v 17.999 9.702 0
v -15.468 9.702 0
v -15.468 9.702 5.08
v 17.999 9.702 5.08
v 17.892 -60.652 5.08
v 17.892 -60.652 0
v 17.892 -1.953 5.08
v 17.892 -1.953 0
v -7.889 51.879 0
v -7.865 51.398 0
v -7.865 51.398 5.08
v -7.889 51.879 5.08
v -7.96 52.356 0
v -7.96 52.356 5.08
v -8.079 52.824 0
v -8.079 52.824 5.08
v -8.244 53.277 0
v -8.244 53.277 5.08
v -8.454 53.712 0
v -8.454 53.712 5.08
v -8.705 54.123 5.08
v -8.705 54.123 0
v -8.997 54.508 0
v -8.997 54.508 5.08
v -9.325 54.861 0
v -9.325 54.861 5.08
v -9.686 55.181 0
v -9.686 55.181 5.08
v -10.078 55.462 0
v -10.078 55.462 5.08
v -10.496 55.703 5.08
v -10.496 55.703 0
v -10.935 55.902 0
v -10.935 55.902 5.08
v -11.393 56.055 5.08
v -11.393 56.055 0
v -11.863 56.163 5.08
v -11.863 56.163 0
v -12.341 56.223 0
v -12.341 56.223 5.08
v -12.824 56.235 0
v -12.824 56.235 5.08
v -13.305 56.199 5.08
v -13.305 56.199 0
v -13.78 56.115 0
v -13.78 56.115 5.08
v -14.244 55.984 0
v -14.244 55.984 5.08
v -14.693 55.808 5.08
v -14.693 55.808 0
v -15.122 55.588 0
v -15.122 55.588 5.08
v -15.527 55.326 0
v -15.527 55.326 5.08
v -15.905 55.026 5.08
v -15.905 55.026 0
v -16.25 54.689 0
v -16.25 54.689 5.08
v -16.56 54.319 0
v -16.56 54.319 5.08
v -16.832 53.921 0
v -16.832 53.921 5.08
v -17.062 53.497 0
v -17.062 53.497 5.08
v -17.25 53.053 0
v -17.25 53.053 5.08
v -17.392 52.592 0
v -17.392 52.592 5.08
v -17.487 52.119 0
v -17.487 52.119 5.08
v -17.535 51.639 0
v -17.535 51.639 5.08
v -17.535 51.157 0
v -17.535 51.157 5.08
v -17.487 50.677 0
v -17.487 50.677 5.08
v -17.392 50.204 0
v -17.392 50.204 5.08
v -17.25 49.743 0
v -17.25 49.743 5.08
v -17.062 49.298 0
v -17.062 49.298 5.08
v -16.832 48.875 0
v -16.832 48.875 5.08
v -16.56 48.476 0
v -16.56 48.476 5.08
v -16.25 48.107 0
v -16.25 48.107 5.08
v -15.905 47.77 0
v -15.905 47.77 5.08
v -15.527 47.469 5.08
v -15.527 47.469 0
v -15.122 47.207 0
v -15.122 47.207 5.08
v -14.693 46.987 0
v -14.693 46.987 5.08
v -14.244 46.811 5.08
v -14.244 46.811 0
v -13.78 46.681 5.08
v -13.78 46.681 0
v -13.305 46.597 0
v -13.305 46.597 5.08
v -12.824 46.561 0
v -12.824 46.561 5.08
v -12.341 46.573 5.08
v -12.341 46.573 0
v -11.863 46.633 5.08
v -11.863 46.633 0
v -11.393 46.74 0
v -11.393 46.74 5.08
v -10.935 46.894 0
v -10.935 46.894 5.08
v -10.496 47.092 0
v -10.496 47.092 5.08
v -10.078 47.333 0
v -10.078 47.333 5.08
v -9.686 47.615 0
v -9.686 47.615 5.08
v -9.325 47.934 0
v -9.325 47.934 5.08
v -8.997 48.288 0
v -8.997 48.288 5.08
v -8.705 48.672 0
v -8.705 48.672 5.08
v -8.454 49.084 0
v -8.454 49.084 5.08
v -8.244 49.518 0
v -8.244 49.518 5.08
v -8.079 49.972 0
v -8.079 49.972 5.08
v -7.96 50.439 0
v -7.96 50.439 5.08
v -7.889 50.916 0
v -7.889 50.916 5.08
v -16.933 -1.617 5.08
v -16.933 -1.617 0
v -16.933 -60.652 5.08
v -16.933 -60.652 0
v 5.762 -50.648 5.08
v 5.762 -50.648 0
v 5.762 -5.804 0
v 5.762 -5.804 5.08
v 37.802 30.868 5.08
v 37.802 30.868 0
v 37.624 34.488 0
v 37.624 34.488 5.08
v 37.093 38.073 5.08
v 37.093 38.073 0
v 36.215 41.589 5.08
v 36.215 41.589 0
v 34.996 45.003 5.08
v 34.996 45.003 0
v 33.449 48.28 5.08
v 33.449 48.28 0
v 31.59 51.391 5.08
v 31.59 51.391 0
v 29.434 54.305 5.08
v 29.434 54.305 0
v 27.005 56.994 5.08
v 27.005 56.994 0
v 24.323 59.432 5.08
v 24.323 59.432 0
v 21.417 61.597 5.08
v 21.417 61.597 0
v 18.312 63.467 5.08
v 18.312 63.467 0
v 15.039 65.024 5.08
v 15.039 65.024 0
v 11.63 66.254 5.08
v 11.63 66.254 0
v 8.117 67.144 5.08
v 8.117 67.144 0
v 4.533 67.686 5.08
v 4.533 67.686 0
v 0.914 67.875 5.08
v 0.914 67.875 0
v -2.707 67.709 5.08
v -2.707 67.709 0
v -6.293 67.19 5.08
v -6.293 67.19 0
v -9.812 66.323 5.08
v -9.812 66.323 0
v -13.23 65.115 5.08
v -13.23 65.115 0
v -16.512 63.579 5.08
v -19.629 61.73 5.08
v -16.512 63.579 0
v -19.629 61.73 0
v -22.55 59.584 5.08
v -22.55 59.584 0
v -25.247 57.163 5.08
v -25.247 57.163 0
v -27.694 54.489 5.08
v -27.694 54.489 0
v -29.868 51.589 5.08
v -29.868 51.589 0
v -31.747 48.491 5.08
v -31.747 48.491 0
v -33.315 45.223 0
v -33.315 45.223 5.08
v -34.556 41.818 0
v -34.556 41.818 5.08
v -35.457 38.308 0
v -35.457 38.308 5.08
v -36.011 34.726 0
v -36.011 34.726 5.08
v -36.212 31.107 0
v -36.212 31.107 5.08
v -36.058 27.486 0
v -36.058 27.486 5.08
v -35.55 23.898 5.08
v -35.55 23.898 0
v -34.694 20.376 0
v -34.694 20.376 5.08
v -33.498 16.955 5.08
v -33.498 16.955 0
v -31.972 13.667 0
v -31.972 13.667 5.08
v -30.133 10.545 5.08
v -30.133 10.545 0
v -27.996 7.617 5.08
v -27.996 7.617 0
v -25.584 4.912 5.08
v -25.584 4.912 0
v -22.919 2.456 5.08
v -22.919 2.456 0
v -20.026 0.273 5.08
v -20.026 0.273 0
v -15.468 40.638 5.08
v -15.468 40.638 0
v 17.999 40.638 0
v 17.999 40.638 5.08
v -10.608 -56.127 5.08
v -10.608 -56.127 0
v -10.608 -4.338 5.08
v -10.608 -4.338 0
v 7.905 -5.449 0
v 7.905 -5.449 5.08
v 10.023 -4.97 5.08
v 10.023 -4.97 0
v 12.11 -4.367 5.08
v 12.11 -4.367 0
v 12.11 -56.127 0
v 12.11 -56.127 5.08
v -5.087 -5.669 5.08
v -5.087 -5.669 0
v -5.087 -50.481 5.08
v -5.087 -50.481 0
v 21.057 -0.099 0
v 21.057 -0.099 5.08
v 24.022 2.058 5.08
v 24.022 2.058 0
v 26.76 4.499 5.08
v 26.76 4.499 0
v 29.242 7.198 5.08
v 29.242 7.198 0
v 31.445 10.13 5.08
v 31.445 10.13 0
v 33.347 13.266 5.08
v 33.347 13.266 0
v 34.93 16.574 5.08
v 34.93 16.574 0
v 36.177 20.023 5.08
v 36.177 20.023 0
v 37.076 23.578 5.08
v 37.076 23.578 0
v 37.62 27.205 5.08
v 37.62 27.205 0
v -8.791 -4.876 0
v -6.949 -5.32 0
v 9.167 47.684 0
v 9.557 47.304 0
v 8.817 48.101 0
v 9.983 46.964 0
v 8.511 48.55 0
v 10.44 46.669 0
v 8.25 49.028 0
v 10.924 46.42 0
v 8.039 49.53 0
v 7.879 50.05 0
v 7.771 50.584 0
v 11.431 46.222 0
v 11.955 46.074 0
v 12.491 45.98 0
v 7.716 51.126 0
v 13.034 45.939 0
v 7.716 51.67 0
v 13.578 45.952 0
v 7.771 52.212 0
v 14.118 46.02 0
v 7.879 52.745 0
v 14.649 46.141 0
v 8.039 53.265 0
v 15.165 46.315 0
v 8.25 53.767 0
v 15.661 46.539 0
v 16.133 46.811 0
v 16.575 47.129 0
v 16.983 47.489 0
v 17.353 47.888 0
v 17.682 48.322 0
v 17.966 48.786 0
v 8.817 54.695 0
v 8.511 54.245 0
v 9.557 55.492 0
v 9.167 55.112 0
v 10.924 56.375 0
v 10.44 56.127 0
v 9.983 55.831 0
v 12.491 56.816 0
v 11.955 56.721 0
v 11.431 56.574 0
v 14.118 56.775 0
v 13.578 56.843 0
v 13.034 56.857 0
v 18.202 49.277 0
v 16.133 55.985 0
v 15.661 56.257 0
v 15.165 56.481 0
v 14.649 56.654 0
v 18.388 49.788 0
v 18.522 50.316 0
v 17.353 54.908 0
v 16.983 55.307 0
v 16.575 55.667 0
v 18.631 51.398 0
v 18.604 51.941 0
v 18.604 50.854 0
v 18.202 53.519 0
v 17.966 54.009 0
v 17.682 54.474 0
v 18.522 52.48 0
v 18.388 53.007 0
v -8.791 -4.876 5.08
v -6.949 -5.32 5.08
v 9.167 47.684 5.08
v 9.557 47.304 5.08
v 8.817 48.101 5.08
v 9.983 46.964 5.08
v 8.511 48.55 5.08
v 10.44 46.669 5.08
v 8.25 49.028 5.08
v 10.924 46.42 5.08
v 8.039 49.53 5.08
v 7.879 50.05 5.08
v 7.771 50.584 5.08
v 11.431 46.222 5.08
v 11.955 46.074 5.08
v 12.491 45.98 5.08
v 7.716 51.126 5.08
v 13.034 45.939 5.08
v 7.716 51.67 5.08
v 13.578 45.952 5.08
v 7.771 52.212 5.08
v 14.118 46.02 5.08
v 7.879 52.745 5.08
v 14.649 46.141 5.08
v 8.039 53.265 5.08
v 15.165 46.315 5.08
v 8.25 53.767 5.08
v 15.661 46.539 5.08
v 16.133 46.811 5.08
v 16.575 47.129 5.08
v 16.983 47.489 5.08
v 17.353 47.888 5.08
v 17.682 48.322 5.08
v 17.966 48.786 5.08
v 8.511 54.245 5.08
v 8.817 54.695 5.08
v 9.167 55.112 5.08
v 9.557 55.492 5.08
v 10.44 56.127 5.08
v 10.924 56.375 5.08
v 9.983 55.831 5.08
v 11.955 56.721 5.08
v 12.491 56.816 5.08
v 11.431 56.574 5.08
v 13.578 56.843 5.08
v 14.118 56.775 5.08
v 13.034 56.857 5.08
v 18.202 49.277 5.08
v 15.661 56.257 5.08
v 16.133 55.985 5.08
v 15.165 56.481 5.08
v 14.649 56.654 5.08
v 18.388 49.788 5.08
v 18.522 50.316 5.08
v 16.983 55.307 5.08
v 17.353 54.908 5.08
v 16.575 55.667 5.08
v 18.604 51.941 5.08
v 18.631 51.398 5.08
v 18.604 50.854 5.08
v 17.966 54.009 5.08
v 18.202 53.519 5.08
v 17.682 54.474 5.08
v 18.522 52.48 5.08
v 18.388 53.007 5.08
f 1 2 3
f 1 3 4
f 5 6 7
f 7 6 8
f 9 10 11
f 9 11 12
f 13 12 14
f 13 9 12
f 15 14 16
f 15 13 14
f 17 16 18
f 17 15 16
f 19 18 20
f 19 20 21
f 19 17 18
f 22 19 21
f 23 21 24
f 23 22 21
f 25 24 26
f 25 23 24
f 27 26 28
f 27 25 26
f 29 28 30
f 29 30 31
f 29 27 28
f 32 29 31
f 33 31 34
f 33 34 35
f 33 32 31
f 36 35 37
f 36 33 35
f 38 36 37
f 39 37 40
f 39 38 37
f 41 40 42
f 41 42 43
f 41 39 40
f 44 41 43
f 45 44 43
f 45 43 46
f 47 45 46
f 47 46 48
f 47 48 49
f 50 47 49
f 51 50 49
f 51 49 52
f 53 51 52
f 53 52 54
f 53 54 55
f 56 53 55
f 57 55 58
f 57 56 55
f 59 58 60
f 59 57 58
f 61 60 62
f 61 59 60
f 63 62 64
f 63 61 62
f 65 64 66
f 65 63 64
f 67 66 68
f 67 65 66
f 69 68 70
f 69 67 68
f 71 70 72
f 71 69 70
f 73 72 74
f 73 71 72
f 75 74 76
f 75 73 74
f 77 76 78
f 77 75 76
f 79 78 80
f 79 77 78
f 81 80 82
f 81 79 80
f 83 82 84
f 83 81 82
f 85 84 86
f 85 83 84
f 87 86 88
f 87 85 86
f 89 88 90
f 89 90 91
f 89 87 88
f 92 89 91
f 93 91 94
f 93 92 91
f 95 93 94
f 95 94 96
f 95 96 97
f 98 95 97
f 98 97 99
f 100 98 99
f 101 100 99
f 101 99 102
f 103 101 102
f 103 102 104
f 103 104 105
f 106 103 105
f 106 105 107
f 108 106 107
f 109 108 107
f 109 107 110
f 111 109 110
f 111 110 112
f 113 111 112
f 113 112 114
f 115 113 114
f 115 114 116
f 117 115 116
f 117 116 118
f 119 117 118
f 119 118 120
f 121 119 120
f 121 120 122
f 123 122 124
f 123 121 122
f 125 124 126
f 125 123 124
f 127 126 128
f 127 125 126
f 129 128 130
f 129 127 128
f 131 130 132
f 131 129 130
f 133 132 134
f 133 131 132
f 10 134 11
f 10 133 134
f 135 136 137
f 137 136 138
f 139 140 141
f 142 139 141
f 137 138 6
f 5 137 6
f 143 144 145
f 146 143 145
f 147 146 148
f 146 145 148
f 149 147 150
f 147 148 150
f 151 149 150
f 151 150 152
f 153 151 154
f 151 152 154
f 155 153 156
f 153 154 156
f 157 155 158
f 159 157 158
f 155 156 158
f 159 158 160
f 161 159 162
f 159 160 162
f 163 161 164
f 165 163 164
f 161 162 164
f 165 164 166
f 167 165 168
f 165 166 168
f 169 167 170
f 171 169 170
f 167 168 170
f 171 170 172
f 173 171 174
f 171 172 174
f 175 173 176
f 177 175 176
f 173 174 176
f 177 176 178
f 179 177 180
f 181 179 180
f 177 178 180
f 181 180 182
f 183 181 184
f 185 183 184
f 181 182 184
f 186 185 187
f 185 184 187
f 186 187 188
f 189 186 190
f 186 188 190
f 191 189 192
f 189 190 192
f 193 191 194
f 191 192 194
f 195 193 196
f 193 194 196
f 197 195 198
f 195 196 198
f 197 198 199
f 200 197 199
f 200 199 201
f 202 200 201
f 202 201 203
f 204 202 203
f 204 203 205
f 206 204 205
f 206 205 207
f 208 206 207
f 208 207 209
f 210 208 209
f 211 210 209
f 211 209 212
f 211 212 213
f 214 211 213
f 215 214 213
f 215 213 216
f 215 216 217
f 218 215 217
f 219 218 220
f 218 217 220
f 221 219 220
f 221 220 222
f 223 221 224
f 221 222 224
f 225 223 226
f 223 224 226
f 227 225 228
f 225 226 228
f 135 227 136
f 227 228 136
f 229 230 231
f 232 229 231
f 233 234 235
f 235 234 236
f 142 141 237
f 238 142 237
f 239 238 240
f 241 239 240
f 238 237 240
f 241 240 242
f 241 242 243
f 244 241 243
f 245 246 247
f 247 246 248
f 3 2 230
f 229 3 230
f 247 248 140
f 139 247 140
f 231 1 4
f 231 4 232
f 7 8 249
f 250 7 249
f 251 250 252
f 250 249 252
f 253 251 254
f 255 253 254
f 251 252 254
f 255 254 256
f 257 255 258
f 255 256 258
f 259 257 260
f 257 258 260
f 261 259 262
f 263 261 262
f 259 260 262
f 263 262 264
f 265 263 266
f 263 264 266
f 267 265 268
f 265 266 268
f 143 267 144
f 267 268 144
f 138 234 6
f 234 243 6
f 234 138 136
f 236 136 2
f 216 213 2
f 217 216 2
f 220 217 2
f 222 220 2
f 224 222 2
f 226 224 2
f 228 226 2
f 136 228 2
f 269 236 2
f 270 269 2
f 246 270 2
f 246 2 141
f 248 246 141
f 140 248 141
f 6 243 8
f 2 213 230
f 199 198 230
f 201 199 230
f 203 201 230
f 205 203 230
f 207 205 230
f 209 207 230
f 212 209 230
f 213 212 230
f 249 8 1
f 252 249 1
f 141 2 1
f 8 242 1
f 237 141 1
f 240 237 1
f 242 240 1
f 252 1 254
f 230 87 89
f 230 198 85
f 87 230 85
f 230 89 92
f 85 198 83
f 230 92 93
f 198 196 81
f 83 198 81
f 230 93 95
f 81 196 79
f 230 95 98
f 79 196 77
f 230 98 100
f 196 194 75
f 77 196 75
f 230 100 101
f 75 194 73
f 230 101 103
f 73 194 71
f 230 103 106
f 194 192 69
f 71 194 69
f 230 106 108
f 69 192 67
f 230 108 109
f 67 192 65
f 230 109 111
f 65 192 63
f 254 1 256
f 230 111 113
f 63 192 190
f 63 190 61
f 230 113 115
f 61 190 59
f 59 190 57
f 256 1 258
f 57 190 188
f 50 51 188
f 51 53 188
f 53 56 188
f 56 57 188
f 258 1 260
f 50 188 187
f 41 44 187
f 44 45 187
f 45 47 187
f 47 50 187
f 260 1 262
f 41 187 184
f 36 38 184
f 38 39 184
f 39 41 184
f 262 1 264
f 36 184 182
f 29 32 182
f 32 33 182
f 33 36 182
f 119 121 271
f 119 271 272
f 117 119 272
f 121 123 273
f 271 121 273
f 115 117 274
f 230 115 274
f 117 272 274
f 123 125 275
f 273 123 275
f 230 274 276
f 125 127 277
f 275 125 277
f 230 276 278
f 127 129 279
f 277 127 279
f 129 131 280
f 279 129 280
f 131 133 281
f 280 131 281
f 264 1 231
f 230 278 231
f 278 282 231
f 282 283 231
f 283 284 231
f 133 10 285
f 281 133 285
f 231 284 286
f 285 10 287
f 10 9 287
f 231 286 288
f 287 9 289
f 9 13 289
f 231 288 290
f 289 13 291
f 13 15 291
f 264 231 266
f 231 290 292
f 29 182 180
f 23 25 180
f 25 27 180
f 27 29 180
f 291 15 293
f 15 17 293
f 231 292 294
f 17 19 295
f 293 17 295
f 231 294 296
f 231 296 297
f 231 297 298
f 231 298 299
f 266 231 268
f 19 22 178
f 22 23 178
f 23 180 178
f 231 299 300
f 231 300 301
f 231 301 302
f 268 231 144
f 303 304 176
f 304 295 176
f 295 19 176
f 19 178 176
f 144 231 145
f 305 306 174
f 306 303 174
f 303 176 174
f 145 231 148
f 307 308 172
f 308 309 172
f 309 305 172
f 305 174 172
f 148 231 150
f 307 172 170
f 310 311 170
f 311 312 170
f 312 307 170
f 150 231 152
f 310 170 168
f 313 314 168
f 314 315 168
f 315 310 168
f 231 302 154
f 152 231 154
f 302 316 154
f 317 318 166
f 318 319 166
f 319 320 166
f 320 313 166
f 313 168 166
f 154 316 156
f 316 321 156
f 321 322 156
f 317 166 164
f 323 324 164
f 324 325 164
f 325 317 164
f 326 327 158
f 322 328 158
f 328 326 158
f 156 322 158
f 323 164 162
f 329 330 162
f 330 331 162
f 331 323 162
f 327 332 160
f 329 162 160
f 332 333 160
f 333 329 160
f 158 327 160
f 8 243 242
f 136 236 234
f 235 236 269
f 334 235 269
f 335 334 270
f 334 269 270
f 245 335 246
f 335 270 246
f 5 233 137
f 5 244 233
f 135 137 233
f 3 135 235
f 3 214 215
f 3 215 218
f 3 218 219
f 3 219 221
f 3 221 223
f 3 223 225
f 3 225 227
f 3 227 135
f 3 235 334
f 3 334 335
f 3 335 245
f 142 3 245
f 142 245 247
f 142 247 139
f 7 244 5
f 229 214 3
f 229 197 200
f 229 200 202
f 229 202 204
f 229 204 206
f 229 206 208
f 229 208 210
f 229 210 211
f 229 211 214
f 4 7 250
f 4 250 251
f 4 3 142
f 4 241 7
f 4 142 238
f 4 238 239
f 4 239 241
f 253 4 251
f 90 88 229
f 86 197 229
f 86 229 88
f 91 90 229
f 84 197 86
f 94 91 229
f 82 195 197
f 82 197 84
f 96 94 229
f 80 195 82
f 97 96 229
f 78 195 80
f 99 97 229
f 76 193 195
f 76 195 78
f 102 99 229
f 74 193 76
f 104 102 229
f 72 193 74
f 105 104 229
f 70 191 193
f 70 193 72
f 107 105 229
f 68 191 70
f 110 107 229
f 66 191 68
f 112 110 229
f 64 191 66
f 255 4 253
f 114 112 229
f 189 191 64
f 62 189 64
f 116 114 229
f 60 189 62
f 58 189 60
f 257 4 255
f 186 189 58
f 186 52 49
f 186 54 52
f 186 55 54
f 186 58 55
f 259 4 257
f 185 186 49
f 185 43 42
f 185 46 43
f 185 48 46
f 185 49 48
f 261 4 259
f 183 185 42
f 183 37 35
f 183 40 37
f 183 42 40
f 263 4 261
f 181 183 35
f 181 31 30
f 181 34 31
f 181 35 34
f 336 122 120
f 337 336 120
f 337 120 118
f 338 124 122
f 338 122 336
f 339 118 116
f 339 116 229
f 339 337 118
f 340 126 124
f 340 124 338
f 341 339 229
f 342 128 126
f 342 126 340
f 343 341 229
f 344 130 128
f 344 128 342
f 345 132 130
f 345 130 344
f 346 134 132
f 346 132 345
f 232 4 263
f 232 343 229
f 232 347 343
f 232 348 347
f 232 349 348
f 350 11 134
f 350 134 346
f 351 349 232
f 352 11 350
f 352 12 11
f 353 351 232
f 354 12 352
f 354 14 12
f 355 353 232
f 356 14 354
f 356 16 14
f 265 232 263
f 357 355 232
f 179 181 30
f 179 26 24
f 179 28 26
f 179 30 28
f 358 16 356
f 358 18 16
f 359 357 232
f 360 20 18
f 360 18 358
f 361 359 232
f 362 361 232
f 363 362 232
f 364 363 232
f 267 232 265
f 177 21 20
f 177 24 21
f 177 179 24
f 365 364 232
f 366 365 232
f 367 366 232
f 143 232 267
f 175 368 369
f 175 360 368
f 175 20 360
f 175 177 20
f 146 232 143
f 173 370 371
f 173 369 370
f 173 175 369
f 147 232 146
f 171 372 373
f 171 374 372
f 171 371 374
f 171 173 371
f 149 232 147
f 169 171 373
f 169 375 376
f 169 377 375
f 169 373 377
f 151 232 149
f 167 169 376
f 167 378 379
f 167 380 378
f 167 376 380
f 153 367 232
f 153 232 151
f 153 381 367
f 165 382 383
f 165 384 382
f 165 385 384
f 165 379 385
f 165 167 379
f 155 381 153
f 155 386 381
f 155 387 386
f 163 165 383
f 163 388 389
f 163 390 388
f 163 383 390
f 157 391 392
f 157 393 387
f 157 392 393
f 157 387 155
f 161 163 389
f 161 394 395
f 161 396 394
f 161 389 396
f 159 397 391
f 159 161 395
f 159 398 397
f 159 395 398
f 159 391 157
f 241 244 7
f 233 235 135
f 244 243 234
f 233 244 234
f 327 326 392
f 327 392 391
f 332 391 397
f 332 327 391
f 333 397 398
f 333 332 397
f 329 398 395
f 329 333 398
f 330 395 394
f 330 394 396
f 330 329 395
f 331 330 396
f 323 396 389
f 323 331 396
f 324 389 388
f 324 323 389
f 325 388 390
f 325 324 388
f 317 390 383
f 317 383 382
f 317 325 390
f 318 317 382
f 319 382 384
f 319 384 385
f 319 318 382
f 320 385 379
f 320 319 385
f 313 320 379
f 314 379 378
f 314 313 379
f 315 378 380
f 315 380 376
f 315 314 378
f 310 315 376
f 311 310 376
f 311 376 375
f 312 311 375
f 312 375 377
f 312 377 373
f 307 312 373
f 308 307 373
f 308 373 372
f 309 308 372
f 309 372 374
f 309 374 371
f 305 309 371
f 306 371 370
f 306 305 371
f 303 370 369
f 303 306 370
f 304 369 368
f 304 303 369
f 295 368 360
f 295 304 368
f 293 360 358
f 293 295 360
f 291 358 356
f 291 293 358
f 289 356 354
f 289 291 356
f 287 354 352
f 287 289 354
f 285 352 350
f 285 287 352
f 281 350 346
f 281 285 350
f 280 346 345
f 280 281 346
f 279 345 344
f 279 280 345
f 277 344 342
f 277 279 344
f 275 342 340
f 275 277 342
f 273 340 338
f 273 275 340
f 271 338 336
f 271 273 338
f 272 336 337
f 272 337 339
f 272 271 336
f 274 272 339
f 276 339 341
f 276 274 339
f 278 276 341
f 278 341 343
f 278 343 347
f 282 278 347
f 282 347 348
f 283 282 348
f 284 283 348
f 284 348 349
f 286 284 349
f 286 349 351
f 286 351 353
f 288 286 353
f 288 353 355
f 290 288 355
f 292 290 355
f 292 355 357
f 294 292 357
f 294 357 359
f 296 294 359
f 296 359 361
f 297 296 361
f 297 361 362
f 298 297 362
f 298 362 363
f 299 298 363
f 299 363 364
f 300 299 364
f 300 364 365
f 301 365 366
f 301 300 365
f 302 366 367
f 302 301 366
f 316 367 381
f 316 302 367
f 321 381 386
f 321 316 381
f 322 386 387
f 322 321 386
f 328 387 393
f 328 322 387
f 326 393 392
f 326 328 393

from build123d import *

# Parameters (mm, degrees)
F0_R     = 4.838468
F0_W     = 33.466397
F0_H     = 30.935322
F0_R_2   = 5.460503
F1_DEPTH = 5.08


with BuildPart() as f1:
    # F0 (on Top) → F1 (new body)
    with BuildSketch(Plane.XY):
        with BuildLine():
            ThreePointArc((17.891966, -1.952547), (32.435058, 11.67451), (37.801563, 30.868229))
            ThreePointArc((37.801563, 30.868229), (-18.093211, 62.692563), (-16.933151, -1.616599))
            Line((-16.933151, -1.616599), (17.891966, -1.952547))
        make_face()
        with Locations((-12.703, 51.397717)):
            Circle(F0_R, mode=Mode.SUBTRACT)
        with Locations((1.265535, 25.170104)):
            Rectangle(F0_W, F0_H, mode=Mode.SUBTRACT)
        with Locations((13.170184, 51.397717)):
            Circle(F0_R_2, mode=Mode.SUBTRACT)
        with BuildLine():
            ThreePointArc((-10.608257, -4.338439), (-13.834146, -3.124943), (-16.933151, -1.616599))
            Line((-16.933151, -1.616599), (-16.933151, -58.892032))
            Line((-16.933151, -58.892032), (-16.933151, -60.651779))
            Line((-16.933151, -60.651779), (17.891966, -60.651779))
            Line((17.891966, -60.651779), (17.891966, -1.952547))
            ThreePointArc((17.891966, -1.952547), (15.052123, -3.282136), (12.109917, -4.366543))
            Line((12.109917, -4.366543), (12.109917, -56.126706))
            Line((12.109917, -56.126706), (-10.608257, -56.126706))
            Line((-10.608257, -56.126706), (-10.608257, -50.480825))
            Line((-10.608257, -50.480825), (-10.608257, -4.338439))
        make_face()
        with BuildLine():
            Line((17.891966, -1.952547), (-16.933151, -1.616599))
            ThreePointArc((-16.933151, -1.616599), (-13.834146, -3.124943), (-10.608257, -4.338439))
            ThreePointArc((-10.608257, -4.338439), (-7.87319, -5.109583), (-5.087015, -5.668589))
            ThreePointArc((-5.087015, -5.668589), (0.33248, -6.136051), (5.761954, -5.804015))
            ThreePointArc((5.761954, -5.804015), (8.967599, -5.225107), (12.109917, -4.366543))
            ThreePointArc((12.109917, -4.366543), (15.052123, -3.282136), (17.891966, -1.952547))
        make_face()
        with BuildLine():
            ThreePointArc((5.761954, -5.804015), (0.33248, -6.136051), (-5.087015, -5.668589))
            Line((-5.087015, -5.668589), (-5.087015, -50.480825))
            Line((-5.087015, -50.480825), (5.761954, -50.64771))
            Line((5.761954, -50.64771), (5.761954, -5.804015))
        make_face()
    extrude(amount=F1_DEPTH)


solid = f1.part
